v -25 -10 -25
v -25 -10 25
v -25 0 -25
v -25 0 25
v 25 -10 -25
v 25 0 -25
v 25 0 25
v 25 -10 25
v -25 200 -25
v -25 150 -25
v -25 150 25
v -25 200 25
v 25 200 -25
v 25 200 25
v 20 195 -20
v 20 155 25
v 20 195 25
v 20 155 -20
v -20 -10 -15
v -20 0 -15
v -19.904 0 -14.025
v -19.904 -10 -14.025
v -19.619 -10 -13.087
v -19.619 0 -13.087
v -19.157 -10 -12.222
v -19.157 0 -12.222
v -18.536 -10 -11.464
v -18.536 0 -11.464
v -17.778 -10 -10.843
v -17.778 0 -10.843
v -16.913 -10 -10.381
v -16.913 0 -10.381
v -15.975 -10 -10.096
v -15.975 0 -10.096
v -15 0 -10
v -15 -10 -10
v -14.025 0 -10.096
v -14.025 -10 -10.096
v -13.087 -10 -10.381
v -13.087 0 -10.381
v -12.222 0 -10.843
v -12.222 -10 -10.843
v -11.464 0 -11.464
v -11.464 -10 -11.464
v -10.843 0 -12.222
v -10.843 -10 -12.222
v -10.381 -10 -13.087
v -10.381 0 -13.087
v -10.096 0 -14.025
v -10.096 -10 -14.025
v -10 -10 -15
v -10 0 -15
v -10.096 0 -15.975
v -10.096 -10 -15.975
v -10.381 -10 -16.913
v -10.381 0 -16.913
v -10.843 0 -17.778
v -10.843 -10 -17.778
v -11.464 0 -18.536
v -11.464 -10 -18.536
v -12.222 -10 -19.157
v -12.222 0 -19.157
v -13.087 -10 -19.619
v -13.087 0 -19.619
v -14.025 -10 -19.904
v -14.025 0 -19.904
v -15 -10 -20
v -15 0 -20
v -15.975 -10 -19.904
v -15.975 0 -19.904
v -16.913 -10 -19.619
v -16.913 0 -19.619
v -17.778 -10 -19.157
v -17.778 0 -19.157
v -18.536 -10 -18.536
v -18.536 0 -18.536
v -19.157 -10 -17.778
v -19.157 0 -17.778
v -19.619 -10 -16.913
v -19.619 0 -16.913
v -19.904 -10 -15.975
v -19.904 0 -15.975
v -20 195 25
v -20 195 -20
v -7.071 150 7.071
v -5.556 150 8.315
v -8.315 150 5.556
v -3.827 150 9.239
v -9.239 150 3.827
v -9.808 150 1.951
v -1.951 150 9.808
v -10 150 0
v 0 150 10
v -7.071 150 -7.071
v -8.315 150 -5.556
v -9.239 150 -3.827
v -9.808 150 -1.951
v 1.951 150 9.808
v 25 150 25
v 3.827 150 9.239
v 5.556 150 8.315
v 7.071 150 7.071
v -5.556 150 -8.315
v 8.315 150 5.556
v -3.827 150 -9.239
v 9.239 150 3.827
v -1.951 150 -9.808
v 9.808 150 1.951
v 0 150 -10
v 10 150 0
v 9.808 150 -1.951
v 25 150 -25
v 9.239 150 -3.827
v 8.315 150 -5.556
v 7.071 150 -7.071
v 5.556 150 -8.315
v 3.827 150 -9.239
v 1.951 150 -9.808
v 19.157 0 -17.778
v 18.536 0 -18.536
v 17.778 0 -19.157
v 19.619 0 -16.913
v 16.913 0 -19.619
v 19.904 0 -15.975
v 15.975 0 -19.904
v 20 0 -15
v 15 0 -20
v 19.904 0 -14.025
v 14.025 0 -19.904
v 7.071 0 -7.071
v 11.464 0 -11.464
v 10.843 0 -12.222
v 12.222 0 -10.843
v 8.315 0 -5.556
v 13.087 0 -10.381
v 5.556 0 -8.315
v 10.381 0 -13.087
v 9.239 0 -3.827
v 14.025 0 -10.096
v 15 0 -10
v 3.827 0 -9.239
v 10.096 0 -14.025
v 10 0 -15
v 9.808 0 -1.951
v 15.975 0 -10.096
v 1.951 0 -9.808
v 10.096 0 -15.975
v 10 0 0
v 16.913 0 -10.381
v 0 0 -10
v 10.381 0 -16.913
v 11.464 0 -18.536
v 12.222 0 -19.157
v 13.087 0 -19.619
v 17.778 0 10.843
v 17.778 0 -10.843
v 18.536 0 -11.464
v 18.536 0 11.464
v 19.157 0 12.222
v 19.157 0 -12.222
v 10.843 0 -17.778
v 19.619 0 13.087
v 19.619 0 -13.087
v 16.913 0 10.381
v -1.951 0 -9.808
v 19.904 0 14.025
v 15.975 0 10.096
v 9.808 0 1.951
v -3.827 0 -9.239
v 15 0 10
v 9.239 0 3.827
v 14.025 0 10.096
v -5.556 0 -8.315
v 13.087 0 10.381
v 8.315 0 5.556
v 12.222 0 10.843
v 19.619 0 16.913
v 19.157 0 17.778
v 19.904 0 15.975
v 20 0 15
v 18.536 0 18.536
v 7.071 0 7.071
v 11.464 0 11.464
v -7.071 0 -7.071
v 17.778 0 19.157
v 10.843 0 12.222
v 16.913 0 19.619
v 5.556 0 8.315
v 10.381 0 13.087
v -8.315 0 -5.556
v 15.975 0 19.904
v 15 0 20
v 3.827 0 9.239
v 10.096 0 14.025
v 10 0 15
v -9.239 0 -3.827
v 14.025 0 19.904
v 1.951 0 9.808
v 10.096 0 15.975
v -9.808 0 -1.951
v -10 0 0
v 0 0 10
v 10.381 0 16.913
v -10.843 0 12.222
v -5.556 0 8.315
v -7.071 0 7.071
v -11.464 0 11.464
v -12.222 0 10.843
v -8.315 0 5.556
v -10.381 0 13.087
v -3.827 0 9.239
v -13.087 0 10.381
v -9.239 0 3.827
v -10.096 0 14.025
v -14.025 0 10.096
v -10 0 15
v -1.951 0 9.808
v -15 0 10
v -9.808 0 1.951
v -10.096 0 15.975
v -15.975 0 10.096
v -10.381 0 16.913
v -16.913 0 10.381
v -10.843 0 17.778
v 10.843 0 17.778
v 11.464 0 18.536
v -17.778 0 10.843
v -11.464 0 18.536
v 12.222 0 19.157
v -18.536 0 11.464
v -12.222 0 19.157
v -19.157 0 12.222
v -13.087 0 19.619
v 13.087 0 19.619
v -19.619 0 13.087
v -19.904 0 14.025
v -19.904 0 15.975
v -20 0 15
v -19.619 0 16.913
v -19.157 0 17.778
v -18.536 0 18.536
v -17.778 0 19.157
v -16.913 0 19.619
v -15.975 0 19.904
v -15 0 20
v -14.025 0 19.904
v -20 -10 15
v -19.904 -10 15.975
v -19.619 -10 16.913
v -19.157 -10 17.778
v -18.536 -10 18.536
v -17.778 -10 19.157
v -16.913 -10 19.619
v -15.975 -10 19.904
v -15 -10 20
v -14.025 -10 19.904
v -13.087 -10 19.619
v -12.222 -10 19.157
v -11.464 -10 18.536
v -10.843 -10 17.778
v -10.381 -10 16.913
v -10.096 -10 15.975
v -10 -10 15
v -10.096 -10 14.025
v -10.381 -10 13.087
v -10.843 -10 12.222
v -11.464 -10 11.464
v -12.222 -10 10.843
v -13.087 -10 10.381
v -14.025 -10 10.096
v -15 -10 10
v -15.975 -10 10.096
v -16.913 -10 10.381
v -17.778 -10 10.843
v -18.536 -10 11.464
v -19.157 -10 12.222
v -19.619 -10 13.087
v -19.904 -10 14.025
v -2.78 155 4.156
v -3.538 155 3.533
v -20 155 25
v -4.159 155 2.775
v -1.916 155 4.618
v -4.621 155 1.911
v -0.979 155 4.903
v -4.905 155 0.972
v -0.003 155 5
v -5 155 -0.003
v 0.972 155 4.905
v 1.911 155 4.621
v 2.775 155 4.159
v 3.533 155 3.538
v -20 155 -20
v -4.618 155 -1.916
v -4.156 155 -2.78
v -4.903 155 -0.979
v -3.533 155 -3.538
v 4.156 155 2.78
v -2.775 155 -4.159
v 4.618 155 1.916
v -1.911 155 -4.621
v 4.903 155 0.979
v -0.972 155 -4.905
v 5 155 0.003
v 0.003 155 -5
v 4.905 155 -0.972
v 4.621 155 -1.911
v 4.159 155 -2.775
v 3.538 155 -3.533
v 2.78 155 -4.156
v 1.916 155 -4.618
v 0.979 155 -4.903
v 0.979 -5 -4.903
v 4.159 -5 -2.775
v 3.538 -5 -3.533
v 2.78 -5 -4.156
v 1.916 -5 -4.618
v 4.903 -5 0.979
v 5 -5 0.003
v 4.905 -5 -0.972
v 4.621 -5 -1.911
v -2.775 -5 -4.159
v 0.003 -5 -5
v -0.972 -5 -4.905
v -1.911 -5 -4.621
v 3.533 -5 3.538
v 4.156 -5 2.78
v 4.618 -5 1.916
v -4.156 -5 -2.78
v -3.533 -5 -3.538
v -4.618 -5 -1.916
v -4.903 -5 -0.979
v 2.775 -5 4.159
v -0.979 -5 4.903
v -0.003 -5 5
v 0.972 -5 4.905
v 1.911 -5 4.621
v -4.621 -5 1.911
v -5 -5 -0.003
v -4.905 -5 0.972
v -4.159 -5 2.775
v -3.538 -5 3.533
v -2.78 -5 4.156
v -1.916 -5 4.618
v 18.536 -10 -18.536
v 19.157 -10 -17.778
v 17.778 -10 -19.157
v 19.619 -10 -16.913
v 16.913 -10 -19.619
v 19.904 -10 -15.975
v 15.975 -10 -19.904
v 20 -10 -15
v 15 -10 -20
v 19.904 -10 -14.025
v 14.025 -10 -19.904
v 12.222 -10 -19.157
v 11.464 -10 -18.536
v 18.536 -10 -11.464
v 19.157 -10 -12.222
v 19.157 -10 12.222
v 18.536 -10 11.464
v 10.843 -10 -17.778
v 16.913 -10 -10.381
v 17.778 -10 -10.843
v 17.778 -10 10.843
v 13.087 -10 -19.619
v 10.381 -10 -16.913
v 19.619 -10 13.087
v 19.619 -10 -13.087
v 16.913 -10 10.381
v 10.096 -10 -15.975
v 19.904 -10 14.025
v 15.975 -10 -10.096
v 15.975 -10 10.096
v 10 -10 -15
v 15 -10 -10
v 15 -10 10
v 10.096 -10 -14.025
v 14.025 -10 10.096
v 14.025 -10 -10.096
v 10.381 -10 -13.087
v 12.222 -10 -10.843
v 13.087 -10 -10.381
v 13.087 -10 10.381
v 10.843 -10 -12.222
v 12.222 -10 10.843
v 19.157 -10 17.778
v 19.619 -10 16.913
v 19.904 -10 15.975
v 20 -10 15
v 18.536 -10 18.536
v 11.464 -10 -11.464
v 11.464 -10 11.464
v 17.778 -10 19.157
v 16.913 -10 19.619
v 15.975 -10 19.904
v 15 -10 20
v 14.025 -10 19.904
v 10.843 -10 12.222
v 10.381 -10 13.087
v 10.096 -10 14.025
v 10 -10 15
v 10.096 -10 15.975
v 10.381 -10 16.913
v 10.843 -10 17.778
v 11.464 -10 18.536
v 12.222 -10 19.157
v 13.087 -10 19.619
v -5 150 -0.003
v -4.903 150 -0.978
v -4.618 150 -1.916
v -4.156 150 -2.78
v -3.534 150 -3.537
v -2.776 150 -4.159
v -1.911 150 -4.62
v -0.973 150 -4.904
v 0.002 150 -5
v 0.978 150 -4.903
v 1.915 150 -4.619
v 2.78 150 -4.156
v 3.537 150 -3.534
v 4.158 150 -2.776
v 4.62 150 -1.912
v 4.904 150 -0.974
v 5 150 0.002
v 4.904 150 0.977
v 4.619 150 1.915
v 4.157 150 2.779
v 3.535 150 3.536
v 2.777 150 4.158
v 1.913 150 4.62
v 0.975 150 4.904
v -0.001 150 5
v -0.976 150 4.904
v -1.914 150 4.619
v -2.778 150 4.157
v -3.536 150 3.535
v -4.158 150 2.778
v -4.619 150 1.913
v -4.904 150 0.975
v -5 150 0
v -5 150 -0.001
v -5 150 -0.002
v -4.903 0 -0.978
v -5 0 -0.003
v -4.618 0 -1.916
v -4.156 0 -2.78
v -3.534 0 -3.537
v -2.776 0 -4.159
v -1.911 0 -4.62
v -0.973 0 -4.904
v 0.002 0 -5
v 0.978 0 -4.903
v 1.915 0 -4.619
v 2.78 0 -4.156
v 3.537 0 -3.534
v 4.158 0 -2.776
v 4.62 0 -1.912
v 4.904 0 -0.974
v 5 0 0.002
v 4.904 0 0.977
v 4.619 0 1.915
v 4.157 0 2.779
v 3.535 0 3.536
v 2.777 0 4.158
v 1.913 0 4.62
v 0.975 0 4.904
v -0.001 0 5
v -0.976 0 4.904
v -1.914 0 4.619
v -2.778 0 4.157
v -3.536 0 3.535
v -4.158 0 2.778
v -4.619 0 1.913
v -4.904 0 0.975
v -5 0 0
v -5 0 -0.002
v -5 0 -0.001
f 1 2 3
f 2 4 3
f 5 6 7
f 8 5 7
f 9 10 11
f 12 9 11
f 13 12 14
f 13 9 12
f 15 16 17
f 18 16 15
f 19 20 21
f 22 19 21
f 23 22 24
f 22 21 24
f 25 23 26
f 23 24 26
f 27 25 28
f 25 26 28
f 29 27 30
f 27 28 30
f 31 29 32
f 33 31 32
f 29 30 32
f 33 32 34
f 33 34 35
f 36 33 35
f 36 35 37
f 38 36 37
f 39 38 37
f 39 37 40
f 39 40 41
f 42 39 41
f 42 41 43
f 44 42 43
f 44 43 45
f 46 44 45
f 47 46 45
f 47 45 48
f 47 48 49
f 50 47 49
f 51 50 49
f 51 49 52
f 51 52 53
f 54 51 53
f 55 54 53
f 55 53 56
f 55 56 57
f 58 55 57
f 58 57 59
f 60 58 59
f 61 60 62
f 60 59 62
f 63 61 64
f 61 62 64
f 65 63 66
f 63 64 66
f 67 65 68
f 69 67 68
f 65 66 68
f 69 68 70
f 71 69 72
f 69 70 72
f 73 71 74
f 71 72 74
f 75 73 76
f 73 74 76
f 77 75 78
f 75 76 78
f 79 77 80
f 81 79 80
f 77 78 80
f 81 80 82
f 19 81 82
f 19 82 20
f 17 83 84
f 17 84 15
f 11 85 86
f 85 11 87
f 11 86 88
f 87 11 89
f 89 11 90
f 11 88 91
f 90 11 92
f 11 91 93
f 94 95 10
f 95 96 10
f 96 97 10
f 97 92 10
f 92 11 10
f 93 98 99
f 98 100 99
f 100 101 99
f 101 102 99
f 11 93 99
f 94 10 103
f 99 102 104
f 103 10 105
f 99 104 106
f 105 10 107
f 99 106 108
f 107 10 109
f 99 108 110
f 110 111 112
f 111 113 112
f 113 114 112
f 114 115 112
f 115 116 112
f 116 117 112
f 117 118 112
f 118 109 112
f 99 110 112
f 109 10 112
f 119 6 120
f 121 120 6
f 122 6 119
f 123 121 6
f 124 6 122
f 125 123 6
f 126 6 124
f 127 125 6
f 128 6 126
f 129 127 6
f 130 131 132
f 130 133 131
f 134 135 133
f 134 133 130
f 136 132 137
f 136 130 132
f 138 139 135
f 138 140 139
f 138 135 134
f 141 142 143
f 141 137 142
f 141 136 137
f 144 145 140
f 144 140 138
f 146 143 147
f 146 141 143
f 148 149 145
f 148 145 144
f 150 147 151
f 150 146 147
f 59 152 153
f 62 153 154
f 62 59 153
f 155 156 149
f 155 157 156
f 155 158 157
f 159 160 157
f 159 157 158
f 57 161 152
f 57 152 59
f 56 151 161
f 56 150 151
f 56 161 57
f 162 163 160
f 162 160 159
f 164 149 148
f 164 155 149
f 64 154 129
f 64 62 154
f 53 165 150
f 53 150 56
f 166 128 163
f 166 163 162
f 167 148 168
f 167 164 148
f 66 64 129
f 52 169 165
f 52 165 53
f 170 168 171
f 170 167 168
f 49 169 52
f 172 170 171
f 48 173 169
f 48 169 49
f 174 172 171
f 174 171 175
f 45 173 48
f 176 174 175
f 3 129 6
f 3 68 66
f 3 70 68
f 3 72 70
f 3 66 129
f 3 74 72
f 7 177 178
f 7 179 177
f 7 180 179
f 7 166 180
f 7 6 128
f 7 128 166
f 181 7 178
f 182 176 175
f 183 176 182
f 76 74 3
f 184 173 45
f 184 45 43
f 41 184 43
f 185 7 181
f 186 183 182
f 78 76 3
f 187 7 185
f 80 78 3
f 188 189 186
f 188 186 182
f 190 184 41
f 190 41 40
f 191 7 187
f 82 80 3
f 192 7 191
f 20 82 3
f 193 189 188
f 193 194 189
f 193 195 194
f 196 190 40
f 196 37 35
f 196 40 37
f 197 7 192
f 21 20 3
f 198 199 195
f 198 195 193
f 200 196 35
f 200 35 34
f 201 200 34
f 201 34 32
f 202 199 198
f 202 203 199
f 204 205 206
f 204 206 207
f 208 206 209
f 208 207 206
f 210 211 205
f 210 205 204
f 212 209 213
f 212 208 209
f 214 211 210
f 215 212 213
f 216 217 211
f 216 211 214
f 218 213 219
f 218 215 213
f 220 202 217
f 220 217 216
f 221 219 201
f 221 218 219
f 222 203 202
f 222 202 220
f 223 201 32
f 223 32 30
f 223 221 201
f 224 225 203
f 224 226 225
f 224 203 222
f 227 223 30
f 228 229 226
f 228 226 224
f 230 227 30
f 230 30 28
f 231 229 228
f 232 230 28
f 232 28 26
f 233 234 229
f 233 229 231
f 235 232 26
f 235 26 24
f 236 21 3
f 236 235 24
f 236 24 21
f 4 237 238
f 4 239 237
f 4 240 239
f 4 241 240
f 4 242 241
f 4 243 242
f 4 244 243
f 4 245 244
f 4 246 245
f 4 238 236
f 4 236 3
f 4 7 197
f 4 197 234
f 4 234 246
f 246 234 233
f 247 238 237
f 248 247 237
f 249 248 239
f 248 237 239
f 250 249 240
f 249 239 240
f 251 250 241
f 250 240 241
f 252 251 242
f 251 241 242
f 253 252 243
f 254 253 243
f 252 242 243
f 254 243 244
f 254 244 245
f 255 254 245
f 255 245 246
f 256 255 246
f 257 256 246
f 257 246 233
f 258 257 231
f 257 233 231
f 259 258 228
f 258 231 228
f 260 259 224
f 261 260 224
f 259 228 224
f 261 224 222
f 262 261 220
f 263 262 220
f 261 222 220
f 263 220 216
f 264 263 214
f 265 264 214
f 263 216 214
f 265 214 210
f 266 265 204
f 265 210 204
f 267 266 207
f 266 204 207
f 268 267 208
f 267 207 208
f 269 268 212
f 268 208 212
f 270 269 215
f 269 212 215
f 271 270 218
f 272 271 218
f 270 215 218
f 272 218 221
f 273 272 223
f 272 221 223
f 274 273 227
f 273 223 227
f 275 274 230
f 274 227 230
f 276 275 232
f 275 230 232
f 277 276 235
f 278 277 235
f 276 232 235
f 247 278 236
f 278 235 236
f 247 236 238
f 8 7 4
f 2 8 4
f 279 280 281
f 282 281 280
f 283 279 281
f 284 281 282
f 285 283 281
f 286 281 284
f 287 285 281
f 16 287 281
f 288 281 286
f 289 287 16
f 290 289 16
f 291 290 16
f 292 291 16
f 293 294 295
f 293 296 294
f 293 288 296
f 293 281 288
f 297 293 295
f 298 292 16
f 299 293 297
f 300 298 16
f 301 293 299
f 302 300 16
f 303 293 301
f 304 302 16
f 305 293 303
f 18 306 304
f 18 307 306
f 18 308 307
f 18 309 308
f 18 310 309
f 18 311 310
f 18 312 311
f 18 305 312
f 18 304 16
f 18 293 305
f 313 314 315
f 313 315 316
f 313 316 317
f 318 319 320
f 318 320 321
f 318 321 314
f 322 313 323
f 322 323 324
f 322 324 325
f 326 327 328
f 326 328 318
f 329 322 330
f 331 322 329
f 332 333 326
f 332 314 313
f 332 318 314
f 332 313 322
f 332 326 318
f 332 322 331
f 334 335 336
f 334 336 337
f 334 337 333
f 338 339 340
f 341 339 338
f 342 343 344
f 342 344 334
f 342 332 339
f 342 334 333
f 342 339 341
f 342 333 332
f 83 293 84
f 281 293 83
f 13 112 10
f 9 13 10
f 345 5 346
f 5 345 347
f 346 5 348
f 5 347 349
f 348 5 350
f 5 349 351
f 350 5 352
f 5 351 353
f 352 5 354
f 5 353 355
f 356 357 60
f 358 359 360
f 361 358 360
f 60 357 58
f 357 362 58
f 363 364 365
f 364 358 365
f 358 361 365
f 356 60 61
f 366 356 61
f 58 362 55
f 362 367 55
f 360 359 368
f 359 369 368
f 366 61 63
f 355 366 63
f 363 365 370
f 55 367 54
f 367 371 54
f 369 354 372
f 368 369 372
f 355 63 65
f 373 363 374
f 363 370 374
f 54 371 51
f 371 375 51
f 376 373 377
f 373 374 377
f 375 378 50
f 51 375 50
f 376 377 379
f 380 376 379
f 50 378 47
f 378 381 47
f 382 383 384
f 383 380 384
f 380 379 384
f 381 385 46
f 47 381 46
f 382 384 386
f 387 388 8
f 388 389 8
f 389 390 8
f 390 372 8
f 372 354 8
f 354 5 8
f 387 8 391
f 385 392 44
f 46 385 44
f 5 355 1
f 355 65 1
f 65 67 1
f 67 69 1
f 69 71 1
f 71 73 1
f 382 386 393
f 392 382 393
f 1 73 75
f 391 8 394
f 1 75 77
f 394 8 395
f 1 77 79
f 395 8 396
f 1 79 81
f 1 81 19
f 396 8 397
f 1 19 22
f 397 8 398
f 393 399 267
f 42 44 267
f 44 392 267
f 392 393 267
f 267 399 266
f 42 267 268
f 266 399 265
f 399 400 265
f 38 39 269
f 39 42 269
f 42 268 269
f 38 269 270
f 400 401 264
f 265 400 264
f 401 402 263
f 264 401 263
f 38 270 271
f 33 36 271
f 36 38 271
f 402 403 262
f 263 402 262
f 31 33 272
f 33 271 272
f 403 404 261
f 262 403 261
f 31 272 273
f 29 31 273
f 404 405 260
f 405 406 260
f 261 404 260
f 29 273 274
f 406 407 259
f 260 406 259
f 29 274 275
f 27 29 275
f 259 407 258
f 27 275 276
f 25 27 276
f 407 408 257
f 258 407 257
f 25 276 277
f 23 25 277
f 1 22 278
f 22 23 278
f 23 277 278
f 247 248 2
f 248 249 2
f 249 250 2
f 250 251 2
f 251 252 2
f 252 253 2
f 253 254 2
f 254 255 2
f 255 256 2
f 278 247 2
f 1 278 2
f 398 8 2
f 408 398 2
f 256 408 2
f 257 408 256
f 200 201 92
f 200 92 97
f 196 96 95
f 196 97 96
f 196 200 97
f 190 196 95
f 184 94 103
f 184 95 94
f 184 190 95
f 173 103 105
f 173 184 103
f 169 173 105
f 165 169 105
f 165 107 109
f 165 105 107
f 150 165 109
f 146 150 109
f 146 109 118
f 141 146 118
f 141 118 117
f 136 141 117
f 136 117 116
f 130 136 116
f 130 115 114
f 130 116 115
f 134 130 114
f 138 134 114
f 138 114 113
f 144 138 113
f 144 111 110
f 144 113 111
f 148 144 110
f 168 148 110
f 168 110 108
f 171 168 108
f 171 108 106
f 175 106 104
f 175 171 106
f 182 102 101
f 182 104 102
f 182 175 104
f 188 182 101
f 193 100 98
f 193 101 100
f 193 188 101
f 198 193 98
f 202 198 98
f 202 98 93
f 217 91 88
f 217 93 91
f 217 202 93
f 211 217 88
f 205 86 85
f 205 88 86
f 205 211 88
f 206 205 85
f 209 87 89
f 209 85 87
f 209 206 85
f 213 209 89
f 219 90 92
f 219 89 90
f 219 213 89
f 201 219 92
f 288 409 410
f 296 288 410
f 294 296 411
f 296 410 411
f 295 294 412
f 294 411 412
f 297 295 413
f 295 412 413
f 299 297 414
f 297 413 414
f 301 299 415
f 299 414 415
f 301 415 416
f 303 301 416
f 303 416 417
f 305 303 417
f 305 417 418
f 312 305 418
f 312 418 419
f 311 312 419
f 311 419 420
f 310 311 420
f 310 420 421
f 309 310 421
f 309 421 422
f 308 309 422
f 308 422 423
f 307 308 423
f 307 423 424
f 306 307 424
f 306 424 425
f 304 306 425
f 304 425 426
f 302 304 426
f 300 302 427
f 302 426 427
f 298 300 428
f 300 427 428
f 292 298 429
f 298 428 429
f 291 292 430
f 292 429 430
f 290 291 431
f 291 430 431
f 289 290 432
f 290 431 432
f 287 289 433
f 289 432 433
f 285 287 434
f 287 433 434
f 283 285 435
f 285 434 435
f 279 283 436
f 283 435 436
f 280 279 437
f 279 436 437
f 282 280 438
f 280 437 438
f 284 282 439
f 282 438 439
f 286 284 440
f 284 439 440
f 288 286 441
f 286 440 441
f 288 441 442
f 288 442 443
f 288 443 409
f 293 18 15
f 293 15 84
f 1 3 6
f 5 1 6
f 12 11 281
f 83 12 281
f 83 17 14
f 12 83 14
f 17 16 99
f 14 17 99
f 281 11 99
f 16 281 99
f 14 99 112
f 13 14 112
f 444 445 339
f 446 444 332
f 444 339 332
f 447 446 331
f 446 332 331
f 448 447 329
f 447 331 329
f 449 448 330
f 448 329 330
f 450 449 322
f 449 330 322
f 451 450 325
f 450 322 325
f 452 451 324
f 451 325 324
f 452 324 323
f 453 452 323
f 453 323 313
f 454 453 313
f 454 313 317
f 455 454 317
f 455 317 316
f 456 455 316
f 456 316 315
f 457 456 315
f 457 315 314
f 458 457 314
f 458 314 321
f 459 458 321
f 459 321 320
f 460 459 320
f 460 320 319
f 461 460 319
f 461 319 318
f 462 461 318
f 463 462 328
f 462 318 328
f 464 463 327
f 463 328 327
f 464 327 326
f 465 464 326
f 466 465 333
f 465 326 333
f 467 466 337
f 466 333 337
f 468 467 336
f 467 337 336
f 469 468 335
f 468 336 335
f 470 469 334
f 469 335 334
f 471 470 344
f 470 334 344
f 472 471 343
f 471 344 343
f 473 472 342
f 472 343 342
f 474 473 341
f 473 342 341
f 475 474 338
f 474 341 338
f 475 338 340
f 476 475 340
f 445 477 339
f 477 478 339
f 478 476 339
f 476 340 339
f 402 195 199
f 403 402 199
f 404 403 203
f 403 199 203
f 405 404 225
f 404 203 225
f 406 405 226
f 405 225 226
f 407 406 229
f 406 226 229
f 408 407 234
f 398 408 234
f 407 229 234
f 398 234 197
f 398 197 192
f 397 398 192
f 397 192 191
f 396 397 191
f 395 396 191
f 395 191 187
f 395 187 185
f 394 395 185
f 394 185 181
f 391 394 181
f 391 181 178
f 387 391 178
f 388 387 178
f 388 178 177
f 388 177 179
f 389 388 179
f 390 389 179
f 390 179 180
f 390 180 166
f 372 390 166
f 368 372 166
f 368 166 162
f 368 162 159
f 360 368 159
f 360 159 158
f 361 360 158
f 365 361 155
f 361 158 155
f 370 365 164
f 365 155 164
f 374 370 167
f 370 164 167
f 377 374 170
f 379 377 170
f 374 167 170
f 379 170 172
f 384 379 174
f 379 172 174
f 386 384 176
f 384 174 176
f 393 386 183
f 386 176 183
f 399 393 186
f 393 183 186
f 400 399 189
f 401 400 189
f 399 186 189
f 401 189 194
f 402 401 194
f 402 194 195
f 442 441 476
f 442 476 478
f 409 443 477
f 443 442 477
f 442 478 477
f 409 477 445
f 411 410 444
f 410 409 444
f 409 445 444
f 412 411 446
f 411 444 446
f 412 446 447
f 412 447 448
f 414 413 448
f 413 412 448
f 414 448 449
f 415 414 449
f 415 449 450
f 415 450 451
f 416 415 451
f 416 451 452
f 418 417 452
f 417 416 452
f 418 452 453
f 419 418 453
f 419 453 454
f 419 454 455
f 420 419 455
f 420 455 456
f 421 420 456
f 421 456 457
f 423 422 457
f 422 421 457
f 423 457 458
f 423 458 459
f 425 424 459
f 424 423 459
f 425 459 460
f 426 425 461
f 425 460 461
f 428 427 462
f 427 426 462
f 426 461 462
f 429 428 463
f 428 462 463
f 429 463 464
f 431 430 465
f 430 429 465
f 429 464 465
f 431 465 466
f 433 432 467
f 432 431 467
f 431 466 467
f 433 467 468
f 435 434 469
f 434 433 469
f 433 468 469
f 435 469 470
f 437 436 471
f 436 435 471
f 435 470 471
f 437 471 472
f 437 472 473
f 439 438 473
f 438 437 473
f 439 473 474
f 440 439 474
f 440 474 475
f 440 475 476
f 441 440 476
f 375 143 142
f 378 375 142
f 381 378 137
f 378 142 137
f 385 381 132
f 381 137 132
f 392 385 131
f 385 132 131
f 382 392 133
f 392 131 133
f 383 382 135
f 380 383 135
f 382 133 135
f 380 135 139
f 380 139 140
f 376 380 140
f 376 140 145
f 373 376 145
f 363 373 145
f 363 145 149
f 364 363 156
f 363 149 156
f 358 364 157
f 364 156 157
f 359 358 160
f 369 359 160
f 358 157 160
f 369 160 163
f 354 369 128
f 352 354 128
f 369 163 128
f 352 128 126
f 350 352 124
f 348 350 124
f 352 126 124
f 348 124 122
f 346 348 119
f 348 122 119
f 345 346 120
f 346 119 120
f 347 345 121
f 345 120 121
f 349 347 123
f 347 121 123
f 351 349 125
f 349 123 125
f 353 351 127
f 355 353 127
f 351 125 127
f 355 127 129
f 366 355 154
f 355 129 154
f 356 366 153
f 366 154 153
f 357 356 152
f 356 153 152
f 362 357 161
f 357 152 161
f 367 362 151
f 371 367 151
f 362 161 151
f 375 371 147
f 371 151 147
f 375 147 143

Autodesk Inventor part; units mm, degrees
ref_plane "YZ Plane" through (0, 0, 0) normal (1, 0, 0) x (0, 1, 0)
ref_plane "XZ Plane" through (0, 0, 0) normal (0, 1, 0) x (-1, 0, 0)
ref_plane "XY Plane" through (0, 0, 0) normal (0, 0, 1) x (1, 0, 0)
sketch "Sketch1" plane through (0, 0, 0) normal (0, 1, 0) x (-1, 0, 0)
  line L0 (-25, 25) -> (25, 25)
  line L1 (25, 25) -> (25, -25)
  line L2 (25, -25) -> (-25, -25)
  line L3 (-25, -25) -> (-25, 25)
  line L4 (-25, 25) -> (25, -25) construction
  line L5 (25, 25) -> (-25, -25) construction
  circle A0 centre (15, -15) radius 5
  circle A1 centre (-15, -15) radius 5
  circle A2 centre (15, 15) radius 5
  circle A3 centre (-15, 15) radius 5
  circle A4 centre (0, 0) radius 10
  dimension "d0" = 50
  dimension "d1" = 50
  dimension "d2" = 10
  dimension "d3" = 10
  dimension "d6" = 30
  dimension "d9" = 30
  dimension "d12" = 20
extrude "Extrusion1" add sketch "Sketch1" along normal blind 150 contours A4
extrude "Extrusion2" add sketch "Sketch1" against normal blind 10 contours L0 L1 L2 L3 | A4
thread "Thread1" size "M10x1.5" class "6H" standard "ANSI Metric M Profile" length 8
thread "Thread2" size "M10x1.5" class "6H" standard "ANSI Metric M Profile" length 8
thread "Thread3" size "M10x1.5" class "6H" standard "ANSI Metric M Profile" length 8
thread "Thread4" size "M10x1.5" class "6H" standard "ANSI Metric M Profile" length 8
sketch "Sketch2" plane through (0, 150, 0) normal (0, 1, 0) x (1, 0, 0)
  line L0 (25, 25) -> (-25, 25) projected
  line L1 (-25, 25) -> (-25, -25) projected
  line L2 (-25, -25) -> (25, -25) projected
  line L3 (25, -25) -> (25, 25) projected
  point P0 (0, 0)
extrude "Extrusion3" add sketch "Sketch2" along normal blind 50
shell "Shell1" thickness 5 removed faces 1 at (-8.3333, 166.6667, 25)
equation "\"d1\" = d0"
equation "\"d3\" = d2"
properties part number "camera_pole"
